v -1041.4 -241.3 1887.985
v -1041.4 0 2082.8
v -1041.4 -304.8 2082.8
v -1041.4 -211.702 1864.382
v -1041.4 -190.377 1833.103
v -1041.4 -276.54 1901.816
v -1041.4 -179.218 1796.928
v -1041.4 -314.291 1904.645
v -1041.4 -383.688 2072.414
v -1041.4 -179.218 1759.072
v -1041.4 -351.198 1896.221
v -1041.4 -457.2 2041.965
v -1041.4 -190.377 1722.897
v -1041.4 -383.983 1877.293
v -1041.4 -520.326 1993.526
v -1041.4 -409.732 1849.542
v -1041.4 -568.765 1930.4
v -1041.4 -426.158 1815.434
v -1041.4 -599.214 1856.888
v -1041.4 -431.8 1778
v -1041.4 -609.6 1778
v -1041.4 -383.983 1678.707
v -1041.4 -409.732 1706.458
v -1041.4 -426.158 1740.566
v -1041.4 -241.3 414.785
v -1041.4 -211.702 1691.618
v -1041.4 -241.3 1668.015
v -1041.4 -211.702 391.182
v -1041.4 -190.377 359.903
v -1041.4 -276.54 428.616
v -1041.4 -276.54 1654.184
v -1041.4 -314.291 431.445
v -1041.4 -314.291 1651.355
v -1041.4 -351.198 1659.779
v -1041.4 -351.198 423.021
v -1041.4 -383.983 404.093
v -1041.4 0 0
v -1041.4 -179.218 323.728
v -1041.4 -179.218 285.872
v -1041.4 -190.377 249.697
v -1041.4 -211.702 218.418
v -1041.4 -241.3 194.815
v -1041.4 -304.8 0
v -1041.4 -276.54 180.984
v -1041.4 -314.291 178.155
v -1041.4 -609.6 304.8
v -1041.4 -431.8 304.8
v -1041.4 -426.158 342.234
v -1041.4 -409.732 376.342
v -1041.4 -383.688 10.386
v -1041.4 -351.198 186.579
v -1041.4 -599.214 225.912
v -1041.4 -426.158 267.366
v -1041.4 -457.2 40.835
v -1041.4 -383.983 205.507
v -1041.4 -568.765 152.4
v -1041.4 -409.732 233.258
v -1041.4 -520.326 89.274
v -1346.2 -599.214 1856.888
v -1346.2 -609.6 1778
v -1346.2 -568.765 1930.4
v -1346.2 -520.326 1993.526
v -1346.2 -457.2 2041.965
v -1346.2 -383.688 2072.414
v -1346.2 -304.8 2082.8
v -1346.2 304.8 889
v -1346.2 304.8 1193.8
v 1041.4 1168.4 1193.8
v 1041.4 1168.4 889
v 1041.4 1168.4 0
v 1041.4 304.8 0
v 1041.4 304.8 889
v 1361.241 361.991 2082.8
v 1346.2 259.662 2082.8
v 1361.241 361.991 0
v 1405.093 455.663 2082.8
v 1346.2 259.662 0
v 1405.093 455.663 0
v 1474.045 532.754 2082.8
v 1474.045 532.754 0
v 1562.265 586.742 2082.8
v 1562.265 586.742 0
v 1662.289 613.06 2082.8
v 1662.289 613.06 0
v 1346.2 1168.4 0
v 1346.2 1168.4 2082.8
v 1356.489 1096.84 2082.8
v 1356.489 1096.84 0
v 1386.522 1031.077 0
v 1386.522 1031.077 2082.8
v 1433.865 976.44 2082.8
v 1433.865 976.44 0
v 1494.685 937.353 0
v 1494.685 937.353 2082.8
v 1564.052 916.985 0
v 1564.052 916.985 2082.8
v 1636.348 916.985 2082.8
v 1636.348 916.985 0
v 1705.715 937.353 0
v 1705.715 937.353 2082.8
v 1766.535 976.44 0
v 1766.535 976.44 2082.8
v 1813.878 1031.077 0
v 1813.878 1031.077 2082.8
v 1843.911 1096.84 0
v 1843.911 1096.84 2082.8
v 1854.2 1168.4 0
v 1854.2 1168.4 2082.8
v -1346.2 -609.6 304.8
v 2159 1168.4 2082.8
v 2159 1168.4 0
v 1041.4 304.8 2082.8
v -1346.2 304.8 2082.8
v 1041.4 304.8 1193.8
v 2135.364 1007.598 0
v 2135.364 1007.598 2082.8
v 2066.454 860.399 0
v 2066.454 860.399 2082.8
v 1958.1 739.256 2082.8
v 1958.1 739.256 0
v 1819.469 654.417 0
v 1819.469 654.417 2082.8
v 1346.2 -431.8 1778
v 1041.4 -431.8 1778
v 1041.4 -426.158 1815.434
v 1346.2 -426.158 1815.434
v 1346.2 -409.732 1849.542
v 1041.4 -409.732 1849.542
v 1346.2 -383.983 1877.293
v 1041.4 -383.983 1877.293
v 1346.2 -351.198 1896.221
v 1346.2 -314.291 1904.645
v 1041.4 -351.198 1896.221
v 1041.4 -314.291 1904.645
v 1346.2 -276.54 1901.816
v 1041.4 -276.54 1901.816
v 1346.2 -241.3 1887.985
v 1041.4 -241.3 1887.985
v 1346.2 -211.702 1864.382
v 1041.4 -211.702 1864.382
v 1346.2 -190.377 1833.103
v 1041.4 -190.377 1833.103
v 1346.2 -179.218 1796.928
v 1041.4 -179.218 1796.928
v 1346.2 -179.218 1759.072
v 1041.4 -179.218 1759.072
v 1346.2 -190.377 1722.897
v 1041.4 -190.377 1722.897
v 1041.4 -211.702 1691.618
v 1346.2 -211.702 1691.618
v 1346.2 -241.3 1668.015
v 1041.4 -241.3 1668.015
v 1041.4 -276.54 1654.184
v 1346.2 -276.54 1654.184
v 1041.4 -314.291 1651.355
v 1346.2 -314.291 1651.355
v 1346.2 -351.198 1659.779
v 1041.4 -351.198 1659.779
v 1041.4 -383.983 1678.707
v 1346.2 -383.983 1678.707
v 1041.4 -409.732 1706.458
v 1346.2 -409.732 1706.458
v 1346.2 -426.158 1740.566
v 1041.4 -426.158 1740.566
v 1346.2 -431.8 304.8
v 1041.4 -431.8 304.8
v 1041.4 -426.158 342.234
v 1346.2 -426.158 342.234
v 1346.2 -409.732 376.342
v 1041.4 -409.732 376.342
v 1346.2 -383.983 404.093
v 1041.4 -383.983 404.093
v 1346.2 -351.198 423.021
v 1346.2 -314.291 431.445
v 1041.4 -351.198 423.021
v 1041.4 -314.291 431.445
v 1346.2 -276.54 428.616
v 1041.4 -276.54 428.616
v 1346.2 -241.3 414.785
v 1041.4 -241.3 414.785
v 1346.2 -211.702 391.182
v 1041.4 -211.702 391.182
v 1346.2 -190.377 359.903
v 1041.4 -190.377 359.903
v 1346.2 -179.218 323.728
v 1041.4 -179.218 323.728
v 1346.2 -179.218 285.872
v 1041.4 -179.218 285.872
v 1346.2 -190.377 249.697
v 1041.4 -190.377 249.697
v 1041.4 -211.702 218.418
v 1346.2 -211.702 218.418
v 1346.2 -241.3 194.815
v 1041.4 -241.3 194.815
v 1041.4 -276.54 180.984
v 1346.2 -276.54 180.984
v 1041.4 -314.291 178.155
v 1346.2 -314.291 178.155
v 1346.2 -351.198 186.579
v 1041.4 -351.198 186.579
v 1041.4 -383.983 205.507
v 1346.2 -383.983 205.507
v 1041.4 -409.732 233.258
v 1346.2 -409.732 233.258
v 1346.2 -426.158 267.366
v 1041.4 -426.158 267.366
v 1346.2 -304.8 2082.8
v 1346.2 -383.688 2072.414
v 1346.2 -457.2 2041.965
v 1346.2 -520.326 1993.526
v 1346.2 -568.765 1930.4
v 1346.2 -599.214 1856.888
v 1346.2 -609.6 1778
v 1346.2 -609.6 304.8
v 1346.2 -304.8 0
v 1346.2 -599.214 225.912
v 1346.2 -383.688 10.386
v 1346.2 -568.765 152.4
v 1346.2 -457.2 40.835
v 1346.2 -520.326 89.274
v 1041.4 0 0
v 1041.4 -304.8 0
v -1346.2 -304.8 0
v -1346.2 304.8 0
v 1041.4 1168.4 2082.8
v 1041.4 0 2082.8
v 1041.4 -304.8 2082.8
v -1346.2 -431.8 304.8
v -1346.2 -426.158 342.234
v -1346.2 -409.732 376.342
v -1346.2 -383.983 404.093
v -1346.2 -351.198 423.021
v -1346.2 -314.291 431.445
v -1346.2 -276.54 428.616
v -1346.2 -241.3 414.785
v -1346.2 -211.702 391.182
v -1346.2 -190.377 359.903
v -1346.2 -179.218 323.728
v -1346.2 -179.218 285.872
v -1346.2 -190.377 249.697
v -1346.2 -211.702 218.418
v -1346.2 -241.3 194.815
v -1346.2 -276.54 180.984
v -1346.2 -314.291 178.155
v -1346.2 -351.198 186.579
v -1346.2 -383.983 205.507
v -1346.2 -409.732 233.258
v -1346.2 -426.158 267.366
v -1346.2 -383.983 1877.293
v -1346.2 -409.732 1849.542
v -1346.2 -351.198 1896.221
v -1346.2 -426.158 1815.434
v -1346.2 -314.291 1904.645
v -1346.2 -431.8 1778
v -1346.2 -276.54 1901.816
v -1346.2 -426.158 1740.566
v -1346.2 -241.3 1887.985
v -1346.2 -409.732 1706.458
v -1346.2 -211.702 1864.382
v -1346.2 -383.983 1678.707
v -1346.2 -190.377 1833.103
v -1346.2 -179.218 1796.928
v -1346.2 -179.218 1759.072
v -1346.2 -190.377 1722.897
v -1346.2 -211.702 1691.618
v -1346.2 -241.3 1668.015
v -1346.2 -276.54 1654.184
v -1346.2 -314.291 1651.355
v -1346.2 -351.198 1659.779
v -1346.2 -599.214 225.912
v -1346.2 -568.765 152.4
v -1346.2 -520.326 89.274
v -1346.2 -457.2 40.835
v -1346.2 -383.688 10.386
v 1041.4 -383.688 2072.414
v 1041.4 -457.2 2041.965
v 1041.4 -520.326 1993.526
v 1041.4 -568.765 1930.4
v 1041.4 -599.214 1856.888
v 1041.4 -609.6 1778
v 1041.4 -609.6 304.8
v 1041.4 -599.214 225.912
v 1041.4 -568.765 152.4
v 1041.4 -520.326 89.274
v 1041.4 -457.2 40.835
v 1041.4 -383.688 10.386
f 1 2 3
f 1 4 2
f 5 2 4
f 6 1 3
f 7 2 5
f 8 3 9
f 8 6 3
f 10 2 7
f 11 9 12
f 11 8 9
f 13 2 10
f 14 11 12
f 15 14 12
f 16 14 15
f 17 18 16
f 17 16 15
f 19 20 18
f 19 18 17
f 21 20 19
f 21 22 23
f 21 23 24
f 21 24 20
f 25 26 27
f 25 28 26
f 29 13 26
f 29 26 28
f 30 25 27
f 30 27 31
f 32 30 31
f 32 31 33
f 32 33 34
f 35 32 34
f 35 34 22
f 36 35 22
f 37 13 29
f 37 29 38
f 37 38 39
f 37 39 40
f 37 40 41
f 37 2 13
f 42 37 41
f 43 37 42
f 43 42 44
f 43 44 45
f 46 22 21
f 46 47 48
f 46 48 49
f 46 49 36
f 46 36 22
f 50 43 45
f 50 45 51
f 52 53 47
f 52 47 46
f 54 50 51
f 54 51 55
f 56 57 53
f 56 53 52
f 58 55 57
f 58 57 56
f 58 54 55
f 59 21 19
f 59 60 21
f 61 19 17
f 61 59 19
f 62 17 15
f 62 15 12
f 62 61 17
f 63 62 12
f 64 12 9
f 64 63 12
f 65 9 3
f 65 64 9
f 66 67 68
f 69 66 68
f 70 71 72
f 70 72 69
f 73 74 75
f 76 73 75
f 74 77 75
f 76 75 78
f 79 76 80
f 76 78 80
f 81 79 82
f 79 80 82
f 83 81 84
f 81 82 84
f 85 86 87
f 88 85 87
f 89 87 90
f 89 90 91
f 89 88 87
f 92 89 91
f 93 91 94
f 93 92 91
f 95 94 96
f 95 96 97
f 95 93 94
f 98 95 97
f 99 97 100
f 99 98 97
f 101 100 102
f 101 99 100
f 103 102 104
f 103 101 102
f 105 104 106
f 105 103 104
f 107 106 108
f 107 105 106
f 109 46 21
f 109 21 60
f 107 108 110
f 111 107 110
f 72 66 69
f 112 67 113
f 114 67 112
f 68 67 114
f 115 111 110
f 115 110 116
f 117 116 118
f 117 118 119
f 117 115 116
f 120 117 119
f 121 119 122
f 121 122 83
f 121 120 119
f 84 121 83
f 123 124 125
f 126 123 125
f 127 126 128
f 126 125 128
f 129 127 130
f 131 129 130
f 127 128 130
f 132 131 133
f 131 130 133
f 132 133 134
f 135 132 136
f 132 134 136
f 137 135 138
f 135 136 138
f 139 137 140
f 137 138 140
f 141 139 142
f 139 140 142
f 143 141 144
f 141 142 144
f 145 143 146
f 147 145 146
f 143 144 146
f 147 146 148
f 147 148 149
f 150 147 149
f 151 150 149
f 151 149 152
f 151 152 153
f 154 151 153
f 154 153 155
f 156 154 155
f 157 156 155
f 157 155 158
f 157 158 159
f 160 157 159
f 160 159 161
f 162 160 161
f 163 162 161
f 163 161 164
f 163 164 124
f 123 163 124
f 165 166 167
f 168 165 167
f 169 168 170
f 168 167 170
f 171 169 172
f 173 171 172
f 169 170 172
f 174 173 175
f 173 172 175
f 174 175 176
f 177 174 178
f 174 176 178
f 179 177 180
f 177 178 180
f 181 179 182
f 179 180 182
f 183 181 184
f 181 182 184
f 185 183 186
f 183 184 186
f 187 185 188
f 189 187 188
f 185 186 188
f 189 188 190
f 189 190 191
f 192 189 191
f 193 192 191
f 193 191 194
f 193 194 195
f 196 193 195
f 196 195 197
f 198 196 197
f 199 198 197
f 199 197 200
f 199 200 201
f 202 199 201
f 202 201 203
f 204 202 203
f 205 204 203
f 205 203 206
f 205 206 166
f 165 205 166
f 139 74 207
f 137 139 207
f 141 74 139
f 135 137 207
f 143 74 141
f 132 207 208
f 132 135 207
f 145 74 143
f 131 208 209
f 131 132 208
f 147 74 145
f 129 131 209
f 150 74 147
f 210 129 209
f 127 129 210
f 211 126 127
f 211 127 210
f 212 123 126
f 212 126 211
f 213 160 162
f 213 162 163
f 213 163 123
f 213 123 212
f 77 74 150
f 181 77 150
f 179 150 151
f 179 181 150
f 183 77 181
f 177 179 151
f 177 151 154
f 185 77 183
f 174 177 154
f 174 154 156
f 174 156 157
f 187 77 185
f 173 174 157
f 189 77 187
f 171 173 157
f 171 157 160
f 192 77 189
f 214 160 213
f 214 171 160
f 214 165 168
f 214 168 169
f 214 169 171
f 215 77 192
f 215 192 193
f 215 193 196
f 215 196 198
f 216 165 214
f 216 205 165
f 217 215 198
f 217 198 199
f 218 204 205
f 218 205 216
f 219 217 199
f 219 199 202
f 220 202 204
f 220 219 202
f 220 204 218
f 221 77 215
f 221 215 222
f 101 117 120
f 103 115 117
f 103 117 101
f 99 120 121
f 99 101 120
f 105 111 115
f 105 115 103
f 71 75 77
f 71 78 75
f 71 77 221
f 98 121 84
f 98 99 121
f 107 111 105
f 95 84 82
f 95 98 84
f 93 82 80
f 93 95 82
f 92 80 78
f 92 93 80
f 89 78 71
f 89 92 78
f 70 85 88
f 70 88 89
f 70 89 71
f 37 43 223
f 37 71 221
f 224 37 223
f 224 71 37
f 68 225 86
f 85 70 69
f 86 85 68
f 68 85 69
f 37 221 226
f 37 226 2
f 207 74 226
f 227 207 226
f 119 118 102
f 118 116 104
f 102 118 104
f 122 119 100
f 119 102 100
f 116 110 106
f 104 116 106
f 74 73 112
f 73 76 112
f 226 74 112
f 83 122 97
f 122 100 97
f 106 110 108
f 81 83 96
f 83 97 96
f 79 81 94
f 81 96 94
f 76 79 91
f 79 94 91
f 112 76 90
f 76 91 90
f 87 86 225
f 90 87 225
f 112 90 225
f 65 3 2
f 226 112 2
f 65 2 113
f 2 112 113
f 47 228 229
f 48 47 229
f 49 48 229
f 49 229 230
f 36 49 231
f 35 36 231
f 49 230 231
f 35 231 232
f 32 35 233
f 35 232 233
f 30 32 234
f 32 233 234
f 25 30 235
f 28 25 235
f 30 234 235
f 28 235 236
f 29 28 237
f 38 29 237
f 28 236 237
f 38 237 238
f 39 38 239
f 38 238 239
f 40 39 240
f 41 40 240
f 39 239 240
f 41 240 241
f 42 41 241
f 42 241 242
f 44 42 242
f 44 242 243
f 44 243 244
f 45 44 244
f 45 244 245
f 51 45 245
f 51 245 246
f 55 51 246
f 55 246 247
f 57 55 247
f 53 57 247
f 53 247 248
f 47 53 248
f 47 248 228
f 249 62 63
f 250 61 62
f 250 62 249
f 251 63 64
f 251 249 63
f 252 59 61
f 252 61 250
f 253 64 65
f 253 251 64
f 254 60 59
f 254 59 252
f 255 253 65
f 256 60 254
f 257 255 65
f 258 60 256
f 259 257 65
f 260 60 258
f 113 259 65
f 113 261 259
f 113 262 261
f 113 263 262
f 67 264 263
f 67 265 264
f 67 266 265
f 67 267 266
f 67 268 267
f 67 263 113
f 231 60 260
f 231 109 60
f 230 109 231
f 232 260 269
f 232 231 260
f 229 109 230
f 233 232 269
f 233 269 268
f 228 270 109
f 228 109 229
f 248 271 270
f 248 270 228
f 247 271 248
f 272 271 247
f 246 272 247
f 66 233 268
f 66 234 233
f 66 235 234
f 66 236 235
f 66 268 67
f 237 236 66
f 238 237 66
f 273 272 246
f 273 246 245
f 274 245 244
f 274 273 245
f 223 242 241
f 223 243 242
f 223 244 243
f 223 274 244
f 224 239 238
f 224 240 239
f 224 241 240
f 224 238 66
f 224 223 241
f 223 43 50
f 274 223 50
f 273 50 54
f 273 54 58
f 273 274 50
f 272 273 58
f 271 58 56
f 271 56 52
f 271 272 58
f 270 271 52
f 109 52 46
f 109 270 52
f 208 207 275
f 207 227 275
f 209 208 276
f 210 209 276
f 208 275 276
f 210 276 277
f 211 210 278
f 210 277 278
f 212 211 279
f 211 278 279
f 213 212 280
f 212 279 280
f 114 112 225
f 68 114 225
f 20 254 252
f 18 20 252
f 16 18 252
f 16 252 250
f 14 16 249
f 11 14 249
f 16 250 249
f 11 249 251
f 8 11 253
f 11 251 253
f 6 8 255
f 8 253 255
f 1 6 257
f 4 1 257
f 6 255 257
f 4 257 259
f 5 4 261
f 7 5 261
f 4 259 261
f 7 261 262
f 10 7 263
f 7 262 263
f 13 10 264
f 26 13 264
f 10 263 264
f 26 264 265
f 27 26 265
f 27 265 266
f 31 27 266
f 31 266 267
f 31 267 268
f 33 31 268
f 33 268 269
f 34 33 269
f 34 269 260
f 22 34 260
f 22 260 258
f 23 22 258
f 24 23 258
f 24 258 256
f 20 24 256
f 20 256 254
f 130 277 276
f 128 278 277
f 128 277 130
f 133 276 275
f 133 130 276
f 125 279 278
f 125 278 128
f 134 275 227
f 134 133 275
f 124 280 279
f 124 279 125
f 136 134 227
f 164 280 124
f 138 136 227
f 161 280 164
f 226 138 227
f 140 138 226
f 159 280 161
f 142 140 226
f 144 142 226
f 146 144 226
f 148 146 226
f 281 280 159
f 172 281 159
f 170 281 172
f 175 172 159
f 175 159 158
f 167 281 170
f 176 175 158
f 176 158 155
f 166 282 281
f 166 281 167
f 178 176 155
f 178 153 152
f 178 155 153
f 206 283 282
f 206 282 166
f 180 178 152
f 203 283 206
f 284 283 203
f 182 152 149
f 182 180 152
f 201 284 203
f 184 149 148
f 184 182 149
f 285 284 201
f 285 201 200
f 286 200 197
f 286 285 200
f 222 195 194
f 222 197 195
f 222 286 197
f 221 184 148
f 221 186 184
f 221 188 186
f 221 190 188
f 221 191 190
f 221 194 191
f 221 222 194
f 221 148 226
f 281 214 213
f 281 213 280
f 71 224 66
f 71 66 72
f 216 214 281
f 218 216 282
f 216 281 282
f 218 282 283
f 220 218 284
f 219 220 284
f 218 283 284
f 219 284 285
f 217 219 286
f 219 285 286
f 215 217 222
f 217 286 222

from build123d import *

# Parameters (mm, degrees)
BOSS_EXTRUDE4_DEPTH      = 2082.8
SKETCH3_W                = 2387.6
SKETCH3_H                = 304.8
BOSS_EXTRUDE5_DEPTH      = 863.6
CUT_EXTRUDE1_DEPTH       = 863.6
BOSS_EXTRUDE7_DEPTH      = 889
BOSS_EXTRUDE7_DEPTH_BACK = 1193.8
FILLET3_R                = 355.6
FILLET4_R                = 304.8
FILLET5_R                = 304.8
FILLET6_R                = 304.8
FILLET7_R                = 304.8
SKETCH9_R                = 127
CUT_EXTRUDE2_DEPTH       = 4242.419743435


with BuildPart() as part:
    # Sketch1 → Boss-Extrude4 (new body)
    with BuildSketch(Plane.XY):
        Polygon((-1346.2, -609.6), (-1346.2, 304.8), (1041.4, 304.8), (1041.4, 1168.4), (1346.2, 1168.4), (1346.2, -609.6), (1041.4, -609.6), (1041.4, 0), (-1041.4, 0), (-1041.4, -609.6), align=None)
    extrude(amount=BOSS_EXTRUDE4_DEPTH)

    # Sketch3 → Boss-Extrude5 (add)
    with BuildSketch(Plane(origin=(0, 304.8, 0), x_dir=(1, 0, 0), z_dir=(0, 1, 0))):
        with Locations((-152.4, -1041.4)):
            Rectangle(SKETCH3_W, SKETCH3_H)
    extrude(amount=BOSS_EXTRUDE5_DEPTH)

    # Sketch4 → Cut-Extrude1 (cut)
    with BuildSketch(Plane.XY.offset(1193.8)):
        Polygon((-1346.2, 304.8), (1041.4, 1168.4), (-1346.2, 1168.4), align=None)
    extrude(amount=-CUT_EXTRUDE1_DEPTH, mode=Mode.SUBTRACT)

    # Sketch6 → Boss-Extrude7 (add, two sides: drawn at the far end of the back side and taken through both)
    with BuildSketch(Plane.XY.offset(1193.8).offset(-BOSS_EXTRUDE7_DEPTH_BACK)):
        with BuildLine():
            Line((1041.4, 1168.4), (1346.2, 1168.4))
            ThreePointArc((1346.2, 1168.4), (1600.2, 914.4), (1854.2, 1168.4))
            Line((1854.2, 1168.4), (2159, 1168.4))
            ThreePointArc((2159, 1168.4), (1600.2, 609.6), (1041.4, 1168.4))
        make_face()
    extrude(amount=BOSS_EXTRUDE7_DEPTH + BOSS_EXTRUDE7_DEPTH_BACK)

    # Fillet3
    fillet3_edges = [part.edges().sort_by_distance(p)[0] for p in [
        (1346.2, 670.663684266, 1041.4),
    ]]
    fillet(fillet3_edges, radius=FILLET3_R)

    # Fillet4
    fillet4_edges = [part.edges().sort_by_distance(p)[0] for p in [
        (-1193.8, -609.6, 0),
    ]]
    fillet(fillet4_edges, radius=FILLET4_R)

    # Fillet5
    fillet5_edges = [part.edges().sort_by_distance(p)[0] for p in [
        (-1193.8, -609.6, 2082.8),
    ]]
    fillet(fillet5_edges, radius=FILLET5_R)

    # Fillet6
    fillet6_edges = [part.edges().sort_by_distance(p)[0] for p in [
        (1193.8, -609.6, 2082.8),
    ]]
    fillet(fillet6_edges, radius=FILLET6_R)

    # Fillet7
    fillet7_edges = [part.edges().sort_by_distance(p)[0] for p in [
        (1193.8, -609.6, 0),
    ]]
    fillet(fillet7_edges, radius=FILLET7_R)

    # Sketch9 → Cut-Extrude2 (cut, through all)
    with BuildSketch(Plane.ZY.offset(1346.2)):
        with Locations(Location((1778, -304.8, 0), (0, 0, 270))):
            Circle(SKETCH9_R)
        with Locations(Location((304.8, -304.8, 0), (0, 0, 270))):
            Circle(SKETCH9_R)
    extrude(amount=-CUT_EXTRUDE2_DEPTH, mode=Mode.SUBTRACT)


solid = part.part
